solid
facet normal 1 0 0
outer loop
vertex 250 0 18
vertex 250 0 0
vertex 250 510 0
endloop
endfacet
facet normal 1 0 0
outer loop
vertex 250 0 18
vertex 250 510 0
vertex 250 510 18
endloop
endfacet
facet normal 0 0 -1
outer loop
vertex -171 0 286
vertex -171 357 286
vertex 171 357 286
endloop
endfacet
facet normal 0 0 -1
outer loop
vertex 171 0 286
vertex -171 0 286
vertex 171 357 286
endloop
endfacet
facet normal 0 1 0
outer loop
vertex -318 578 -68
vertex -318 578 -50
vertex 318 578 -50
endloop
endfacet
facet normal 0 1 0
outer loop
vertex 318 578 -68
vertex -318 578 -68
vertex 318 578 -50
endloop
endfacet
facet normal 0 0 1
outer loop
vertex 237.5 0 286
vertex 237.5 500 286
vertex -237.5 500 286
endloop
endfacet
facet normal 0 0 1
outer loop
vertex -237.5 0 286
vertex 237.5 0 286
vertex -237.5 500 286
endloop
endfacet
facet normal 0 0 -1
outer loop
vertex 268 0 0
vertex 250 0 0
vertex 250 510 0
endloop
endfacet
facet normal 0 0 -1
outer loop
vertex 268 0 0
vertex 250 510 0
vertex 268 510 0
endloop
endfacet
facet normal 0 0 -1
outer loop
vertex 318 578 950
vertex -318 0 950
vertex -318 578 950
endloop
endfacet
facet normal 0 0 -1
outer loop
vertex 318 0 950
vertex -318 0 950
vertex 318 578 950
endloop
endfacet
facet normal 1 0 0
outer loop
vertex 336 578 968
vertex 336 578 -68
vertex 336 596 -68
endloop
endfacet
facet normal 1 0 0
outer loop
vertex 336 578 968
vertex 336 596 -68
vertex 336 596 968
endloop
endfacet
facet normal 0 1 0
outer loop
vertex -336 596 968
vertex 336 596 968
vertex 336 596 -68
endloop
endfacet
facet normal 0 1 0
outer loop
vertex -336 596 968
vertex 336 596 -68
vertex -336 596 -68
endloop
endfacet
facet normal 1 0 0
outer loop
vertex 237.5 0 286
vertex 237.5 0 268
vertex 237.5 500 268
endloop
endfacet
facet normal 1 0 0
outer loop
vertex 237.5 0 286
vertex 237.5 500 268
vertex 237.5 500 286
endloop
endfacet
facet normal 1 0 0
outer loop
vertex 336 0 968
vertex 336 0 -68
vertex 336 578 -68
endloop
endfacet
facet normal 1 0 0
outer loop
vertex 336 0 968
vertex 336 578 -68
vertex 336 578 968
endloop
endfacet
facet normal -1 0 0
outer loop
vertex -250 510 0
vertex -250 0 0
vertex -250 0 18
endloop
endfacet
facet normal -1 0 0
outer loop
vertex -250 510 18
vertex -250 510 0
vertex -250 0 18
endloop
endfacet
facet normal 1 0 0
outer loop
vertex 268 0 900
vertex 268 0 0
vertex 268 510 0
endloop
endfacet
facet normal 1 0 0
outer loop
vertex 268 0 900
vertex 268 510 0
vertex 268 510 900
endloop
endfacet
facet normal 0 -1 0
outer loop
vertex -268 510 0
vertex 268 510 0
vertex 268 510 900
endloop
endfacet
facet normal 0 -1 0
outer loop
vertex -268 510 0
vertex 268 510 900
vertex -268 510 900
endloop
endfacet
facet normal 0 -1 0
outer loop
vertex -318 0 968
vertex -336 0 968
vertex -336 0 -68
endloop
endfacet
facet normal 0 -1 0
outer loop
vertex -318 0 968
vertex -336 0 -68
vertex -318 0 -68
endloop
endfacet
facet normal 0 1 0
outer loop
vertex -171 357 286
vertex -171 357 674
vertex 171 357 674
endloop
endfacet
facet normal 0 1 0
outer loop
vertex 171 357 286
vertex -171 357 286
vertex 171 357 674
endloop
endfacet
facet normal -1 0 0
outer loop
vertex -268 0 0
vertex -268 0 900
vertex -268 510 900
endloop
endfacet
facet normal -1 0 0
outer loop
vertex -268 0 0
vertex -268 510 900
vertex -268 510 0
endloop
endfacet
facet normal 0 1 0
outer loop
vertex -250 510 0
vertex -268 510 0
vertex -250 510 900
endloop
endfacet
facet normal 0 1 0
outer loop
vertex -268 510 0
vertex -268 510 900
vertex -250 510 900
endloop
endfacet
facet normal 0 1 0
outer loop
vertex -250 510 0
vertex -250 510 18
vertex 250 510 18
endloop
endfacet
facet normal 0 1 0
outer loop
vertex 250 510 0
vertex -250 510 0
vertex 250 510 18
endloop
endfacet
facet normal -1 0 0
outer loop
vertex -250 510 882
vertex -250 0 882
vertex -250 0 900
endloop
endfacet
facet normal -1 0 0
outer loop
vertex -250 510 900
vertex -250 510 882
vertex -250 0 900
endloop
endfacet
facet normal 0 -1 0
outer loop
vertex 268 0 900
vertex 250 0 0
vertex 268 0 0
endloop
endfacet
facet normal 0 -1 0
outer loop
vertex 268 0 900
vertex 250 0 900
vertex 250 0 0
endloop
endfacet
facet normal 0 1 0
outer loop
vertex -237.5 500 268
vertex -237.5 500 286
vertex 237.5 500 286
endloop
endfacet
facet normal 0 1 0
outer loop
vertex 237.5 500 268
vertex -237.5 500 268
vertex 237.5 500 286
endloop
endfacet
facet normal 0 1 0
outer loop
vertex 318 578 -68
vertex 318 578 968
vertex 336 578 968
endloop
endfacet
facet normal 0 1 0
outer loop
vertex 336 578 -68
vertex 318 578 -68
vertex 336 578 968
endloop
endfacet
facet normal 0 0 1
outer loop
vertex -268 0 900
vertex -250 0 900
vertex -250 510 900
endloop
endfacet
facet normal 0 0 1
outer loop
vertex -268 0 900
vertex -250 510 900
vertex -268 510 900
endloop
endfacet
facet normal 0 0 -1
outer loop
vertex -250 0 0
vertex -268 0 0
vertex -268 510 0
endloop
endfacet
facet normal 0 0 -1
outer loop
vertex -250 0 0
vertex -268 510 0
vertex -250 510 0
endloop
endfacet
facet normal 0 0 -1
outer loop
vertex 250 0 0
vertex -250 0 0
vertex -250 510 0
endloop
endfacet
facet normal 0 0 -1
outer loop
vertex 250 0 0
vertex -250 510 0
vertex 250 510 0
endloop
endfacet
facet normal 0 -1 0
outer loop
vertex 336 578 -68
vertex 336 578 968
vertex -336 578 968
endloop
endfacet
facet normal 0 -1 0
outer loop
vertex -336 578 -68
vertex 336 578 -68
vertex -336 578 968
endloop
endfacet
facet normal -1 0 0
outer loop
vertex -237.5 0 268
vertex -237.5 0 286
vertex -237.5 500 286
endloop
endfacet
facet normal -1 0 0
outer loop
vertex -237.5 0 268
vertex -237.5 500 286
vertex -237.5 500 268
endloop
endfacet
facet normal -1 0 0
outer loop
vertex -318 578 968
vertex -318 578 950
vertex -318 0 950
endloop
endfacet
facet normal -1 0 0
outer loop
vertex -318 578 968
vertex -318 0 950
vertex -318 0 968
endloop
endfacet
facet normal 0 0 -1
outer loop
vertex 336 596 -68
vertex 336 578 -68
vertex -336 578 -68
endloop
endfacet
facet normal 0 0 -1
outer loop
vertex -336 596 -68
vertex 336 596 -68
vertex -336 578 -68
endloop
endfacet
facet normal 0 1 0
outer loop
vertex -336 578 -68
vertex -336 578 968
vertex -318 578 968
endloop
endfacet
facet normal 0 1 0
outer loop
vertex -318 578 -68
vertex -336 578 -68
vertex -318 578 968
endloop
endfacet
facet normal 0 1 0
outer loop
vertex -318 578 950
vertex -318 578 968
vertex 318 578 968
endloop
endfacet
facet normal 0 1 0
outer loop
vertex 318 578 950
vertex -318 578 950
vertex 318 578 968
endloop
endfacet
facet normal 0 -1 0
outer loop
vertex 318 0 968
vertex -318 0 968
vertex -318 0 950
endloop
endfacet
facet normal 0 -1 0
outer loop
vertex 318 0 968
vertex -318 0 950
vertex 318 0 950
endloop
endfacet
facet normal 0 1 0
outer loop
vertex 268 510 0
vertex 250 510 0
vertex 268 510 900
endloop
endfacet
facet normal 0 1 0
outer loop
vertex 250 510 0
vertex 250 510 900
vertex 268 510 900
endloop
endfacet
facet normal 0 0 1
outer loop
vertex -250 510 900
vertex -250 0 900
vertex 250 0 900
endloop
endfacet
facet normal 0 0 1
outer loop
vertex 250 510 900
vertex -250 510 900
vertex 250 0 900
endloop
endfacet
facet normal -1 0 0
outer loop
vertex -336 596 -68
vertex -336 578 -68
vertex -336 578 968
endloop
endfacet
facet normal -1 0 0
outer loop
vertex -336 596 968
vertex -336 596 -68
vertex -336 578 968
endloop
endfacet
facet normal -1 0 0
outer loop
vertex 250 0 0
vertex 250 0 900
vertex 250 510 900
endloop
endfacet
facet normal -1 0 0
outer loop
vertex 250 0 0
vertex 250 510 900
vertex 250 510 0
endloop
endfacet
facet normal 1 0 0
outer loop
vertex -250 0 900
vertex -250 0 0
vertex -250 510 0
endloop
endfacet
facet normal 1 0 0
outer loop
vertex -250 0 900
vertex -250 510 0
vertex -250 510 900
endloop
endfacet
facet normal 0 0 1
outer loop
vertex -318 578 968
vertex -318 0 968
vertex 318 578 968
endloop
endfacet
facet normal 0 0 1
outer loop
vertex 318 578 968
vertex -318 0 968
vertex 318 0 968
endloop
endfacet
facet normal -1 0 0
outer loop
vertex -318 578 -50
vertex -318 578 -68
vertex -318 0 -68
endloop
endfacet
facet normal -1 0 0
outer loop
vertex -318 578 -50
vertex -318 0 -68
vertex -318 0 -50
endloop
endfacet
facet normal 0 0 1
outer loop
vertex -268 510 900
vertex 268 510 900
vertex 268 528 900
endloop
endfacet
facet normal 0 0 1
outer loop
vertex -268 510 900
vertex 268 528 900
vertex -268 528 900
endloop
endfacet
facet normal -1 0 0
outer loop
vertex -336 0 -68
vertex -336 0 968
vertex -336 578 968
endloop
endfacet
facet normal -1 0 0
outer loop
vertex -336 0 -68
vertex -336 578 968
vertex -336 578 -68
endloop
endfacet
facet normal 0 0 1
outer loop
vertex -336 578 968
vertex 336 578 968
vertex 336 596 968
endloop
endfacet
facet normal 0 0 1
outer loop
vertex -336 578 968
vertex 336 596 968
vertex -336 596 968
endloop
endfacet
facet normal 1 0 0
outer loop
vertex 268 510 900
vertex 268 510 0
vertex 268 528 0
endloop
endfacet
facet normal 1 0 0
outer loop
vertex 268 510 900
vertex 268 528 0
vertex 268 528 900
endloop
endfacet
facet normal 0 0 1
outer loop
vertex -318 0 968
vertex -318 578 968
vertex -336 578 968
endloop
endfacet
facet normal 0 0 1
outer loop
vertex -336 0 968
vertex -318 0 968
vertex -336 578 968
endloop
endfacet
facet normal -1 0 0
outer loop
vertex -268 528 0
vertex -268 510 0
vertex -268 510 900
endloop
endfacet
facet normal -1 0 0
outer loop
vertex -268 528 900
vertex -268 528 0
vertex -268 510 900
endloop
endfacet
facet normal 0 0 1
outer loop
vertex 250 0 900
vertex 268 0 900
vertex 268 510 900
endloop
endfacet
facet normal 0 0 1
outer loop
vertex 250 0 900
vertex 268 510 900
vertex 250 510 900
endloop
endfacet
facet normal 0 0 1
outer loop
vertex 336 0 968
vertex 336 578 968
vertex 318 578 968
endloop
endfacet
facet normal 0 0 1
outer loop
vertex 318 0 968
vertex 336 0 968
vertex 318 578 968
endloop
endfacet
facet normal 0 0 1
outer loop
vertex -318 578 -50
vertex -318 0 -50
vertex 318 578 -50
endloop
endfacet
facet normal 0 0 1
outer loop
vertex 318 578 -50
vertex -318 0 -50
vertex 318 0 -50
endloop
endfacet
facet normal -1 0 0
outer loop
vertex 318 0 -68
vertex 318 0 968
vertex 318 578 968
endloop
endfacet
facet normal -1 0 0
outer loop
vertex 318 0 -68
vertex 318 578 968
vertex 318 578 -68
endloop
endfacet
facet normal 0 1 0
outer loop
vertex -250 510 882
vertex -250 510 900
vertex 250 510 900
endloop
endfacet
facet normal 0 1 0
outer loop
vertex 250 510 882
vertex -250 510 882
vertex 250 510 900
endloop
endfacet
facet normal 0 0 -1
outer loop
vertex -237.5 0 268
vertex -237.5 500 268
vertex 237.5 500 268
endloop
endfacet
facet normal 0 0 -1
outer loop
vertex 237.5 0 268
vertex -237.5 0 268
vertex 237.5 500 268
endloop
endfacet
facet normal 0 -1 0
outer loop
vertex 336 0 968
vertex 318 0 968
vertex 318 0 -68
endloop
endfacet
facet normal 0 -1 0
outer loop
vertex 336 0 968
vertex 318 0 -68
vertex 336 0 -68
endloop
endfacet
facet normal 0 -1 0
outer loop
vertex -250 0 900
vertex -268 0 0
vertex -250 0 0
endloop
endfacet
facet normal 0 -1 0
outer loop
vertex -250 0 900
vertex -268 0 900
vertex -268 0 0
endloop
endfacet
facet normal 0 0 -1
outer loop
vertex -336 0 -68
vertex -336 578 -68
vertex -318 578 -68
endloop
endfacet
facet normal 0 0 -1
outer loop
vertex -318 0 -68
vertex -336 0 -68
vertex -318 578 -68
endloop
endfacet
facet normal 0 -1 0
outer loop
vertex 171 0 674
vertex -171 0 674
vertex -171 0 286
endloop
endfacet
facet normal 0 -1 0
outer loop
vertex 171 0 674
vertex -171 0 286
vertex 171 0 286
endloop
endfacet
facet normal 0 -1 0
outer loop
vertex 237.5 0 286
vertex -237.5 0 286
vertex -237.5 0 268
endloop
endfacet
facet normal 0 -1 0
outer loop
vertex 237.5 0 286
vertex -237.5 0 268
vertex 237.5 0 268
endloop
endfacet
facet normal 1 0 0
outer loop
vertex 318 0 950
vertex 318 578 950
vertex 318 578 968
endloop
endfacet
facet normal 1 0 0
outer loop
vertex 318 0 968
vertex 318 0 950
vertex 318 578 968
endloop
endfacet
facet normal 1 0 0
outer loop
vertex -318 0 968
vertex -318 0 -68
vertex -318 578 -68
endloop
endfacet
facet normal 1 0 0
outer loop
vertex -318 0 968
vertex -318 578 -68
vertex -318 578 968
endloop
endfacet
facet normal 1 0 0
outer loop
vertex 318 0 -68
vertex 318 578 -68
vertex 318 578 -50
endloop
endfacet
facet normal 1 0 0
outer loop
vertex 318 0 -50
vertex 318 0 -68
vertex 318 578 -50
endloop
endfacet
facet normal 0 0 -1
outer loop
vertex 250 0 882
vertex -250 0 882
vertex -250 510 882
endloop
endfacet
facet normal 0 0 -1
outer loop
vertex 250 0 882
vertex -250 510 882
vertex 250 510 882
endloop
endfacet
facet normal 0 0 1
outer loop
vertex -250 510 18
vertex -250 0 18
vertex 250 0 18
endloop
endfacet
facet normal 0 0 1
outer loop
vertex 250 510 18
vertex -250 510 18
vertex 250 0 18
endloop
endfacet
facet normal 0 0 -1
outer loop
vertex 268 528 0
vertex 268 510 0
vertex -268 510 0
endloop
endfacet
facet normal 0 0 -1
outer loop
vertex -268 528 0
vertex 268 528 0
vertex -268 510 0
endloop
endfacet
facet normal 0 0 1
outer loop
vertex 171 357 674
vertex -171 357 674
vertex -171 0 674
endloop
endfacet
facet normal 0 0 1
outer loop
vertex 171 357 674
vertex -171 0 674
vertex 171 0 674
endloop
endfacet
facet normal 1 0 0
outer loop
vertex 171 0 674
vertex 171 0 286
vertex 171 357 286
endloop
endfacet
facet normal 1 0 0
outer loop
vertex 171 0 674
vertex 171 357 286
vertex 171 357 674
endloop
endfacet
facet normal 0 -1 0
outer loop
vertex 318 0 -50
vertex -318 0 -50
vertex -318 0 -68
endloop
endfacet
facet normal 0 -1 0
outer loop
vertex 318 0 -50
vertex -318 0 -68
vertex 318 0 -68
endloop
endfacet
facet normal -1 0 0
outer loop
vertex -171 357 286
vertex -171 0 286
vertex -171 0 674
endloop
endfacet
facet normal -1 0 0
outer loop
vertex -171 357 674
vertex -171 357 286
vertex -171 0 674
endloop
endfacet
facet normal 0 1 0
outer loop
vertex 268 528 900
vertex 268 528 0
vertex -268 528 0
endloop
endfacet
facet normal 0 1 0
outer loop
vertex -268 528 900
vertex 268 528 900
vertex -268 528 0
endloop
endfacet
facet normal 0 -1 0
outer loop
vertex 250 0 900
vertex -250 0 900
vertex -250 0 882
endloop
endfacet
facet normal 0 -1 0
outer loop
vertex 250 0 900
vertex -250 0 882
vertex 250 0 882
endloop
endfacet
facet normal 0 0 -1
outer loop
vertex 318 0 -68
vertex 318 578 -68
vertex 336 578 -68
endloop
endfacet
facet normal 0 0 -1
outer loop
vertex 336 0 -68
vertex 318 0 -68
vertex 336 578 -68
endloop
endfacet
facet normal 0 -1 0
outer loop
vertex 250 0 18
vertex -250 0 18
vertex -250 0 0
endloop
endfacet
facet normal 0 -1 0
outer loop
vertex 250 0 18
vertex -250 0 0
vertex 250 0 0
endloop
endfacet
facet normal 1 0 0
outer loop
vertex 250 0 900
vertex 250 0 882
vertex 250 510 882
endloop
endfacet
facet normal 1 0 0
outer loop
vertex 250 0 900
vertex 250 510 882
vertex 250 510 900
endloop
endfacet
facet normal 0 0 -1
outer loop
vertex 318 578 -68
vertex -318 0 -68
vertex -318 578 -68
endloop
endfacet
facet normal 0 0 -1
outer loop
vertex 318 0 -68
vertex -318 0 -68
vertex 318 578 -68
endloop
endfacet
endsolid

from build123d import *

# Parameters (mm, degrees)
F0_W      = 500
F0_H      = 18
F1_DEPTH  = 510
F2_DEPTH  = 500
F3_DEPTH  = 510
F4_DEPTH  = 510
F5_DEPTH  = 510
F6_W      = 342
F6_H      = 388
F7_DEPTH  = 357
F8_W      = 536
F8_H      = 900
F9_DEPTH  = 18
F10_DEPTH = 578
F0_W_2    = 636
F11_DEPTH = 578
F12_DEPTH = 578
F13_DEPTH = 578
F14_W     = 672
F14_H     = 1036
F15_DEPTH = 18


with BuildPart() as f1:
    # F0 (on Front) → F1 (new body)
    with BuildSketch(Plane.XZ):
        with Locations((0, 9)):
            Rectangle(F0_W, F0_H)
    extrude(amount=-F1_DEPTH)


with BuildPart() as f2:
    # F0 (on Front) → F2 (new body)
    with BuildSketch(Plane.XZ):
        Polygon((-237.5, 286), (-237.5, 268), (237.5, 268), (237.5, 286), (219.5, 286), (-219.5, 286), align=None)
    extrude(amount=-F2_DEPTH)


with BuildPart() as f3:
    # F0 (on Front) → F3 (new body)
    with BuildSketch(Plane.XZ):
        Polygon((-268, 0), (-250, 0), (-250, 18), (-250, 882), (-250, 900), (-268, 900), align=None)
    extrude(amount=-F3_DEPTH)


with BuildPart() as f4:
    # F0 (on Front) → F4 (new body)
    with BuildSketch(Plane.XZ):
        Polygon((250, 18), (250, 0), (268, 0), (268, 900), (250, 900), (250, 882), align=None)
    extrude(amount=-F4_DEPTH)


with BuildPart() as f5:
    # F0 (on Front) → F5 (new body)
    with BuildSketch(Plane.XZ):
        with Locations((0, 891)):
            Rectangle(F0_W, F0_H)
    extrude(amount=-F5_DEPTH)


with BuildPart() as f7:
    # F6 (on Front) → F7 (new body)
    with BuildSketch(Plane.XZ):
        with Locations((0, 480)):
            Rectangle(F6_W, F6_H)
    extrude(amount=-F7_DEPTH)


with BuildPart() as f9:
    # F8 (on face) → F9 (new body)
    with BuildSketch(Plane(origin=(0, 510, 0), x_dir=(-1, 0, 0), z_dir=(0, 1, 0))):
        with Locations((0, 450)):
            Rectangle(F8_W, F8_H)
    extrude(amount=F9_DEPTH)


with BuildPart() as f10:
    # F0 (on Front) → F10 (new body)
    with BuildSketch(Plane.XZ):
        Polygon((-318, 950), (-318, 968), (-336, 968), (-336, -68), (-318, -68), (-318, -50), align=None)
    extrude(amount=-F10_DEPTH)


with BuildPart() as f11:
    # F0 (on Front) → F11 (new body)
    with BuildSketch(Plane.XZ):
        with Locations((0, 959)):
            Rectangle(F0_W_2, F0_H)
    extrude(amount=-F11_DEPTH)


with BuildPart() as f12:
    # F0 (on Front) → F12 (new body)
    with BuildSketch(Plane.XZ):
        with Locations((0, -59)):
            Rectangle(F0_W_2, F0_H)
    extrude(amount=-F12_DEPTH)


with BuildPart() as f13:
    # F0 (on Front) → F13 (new body)
    with BuildSketch(Plane.XZ):
        Polygon((336, 968), (318, 968), (318, 950), (318, -50), (318, -68), (336, -68), align=None)
    extrude(amount=-F13_DEPTH)


with BuildPart() as f15:
    # F14 (on face) → F15 (new body)
    with BuildSketch(Plane(origin=(0, 578, 0), x_dir=(-1, 0, 0), z_dir=(0, 1, 0))):
        with Locations((0, 450)):
            Rectangle(F14_W, F14_H)
    extrude(amount=F15_DEPTH)


solid = Compound([f1.part, f2.part, f3.part, f4.part, f5.part, f7.part, f9.part, f10.part, f11.part, f12.part, f13.part, f15.part])
